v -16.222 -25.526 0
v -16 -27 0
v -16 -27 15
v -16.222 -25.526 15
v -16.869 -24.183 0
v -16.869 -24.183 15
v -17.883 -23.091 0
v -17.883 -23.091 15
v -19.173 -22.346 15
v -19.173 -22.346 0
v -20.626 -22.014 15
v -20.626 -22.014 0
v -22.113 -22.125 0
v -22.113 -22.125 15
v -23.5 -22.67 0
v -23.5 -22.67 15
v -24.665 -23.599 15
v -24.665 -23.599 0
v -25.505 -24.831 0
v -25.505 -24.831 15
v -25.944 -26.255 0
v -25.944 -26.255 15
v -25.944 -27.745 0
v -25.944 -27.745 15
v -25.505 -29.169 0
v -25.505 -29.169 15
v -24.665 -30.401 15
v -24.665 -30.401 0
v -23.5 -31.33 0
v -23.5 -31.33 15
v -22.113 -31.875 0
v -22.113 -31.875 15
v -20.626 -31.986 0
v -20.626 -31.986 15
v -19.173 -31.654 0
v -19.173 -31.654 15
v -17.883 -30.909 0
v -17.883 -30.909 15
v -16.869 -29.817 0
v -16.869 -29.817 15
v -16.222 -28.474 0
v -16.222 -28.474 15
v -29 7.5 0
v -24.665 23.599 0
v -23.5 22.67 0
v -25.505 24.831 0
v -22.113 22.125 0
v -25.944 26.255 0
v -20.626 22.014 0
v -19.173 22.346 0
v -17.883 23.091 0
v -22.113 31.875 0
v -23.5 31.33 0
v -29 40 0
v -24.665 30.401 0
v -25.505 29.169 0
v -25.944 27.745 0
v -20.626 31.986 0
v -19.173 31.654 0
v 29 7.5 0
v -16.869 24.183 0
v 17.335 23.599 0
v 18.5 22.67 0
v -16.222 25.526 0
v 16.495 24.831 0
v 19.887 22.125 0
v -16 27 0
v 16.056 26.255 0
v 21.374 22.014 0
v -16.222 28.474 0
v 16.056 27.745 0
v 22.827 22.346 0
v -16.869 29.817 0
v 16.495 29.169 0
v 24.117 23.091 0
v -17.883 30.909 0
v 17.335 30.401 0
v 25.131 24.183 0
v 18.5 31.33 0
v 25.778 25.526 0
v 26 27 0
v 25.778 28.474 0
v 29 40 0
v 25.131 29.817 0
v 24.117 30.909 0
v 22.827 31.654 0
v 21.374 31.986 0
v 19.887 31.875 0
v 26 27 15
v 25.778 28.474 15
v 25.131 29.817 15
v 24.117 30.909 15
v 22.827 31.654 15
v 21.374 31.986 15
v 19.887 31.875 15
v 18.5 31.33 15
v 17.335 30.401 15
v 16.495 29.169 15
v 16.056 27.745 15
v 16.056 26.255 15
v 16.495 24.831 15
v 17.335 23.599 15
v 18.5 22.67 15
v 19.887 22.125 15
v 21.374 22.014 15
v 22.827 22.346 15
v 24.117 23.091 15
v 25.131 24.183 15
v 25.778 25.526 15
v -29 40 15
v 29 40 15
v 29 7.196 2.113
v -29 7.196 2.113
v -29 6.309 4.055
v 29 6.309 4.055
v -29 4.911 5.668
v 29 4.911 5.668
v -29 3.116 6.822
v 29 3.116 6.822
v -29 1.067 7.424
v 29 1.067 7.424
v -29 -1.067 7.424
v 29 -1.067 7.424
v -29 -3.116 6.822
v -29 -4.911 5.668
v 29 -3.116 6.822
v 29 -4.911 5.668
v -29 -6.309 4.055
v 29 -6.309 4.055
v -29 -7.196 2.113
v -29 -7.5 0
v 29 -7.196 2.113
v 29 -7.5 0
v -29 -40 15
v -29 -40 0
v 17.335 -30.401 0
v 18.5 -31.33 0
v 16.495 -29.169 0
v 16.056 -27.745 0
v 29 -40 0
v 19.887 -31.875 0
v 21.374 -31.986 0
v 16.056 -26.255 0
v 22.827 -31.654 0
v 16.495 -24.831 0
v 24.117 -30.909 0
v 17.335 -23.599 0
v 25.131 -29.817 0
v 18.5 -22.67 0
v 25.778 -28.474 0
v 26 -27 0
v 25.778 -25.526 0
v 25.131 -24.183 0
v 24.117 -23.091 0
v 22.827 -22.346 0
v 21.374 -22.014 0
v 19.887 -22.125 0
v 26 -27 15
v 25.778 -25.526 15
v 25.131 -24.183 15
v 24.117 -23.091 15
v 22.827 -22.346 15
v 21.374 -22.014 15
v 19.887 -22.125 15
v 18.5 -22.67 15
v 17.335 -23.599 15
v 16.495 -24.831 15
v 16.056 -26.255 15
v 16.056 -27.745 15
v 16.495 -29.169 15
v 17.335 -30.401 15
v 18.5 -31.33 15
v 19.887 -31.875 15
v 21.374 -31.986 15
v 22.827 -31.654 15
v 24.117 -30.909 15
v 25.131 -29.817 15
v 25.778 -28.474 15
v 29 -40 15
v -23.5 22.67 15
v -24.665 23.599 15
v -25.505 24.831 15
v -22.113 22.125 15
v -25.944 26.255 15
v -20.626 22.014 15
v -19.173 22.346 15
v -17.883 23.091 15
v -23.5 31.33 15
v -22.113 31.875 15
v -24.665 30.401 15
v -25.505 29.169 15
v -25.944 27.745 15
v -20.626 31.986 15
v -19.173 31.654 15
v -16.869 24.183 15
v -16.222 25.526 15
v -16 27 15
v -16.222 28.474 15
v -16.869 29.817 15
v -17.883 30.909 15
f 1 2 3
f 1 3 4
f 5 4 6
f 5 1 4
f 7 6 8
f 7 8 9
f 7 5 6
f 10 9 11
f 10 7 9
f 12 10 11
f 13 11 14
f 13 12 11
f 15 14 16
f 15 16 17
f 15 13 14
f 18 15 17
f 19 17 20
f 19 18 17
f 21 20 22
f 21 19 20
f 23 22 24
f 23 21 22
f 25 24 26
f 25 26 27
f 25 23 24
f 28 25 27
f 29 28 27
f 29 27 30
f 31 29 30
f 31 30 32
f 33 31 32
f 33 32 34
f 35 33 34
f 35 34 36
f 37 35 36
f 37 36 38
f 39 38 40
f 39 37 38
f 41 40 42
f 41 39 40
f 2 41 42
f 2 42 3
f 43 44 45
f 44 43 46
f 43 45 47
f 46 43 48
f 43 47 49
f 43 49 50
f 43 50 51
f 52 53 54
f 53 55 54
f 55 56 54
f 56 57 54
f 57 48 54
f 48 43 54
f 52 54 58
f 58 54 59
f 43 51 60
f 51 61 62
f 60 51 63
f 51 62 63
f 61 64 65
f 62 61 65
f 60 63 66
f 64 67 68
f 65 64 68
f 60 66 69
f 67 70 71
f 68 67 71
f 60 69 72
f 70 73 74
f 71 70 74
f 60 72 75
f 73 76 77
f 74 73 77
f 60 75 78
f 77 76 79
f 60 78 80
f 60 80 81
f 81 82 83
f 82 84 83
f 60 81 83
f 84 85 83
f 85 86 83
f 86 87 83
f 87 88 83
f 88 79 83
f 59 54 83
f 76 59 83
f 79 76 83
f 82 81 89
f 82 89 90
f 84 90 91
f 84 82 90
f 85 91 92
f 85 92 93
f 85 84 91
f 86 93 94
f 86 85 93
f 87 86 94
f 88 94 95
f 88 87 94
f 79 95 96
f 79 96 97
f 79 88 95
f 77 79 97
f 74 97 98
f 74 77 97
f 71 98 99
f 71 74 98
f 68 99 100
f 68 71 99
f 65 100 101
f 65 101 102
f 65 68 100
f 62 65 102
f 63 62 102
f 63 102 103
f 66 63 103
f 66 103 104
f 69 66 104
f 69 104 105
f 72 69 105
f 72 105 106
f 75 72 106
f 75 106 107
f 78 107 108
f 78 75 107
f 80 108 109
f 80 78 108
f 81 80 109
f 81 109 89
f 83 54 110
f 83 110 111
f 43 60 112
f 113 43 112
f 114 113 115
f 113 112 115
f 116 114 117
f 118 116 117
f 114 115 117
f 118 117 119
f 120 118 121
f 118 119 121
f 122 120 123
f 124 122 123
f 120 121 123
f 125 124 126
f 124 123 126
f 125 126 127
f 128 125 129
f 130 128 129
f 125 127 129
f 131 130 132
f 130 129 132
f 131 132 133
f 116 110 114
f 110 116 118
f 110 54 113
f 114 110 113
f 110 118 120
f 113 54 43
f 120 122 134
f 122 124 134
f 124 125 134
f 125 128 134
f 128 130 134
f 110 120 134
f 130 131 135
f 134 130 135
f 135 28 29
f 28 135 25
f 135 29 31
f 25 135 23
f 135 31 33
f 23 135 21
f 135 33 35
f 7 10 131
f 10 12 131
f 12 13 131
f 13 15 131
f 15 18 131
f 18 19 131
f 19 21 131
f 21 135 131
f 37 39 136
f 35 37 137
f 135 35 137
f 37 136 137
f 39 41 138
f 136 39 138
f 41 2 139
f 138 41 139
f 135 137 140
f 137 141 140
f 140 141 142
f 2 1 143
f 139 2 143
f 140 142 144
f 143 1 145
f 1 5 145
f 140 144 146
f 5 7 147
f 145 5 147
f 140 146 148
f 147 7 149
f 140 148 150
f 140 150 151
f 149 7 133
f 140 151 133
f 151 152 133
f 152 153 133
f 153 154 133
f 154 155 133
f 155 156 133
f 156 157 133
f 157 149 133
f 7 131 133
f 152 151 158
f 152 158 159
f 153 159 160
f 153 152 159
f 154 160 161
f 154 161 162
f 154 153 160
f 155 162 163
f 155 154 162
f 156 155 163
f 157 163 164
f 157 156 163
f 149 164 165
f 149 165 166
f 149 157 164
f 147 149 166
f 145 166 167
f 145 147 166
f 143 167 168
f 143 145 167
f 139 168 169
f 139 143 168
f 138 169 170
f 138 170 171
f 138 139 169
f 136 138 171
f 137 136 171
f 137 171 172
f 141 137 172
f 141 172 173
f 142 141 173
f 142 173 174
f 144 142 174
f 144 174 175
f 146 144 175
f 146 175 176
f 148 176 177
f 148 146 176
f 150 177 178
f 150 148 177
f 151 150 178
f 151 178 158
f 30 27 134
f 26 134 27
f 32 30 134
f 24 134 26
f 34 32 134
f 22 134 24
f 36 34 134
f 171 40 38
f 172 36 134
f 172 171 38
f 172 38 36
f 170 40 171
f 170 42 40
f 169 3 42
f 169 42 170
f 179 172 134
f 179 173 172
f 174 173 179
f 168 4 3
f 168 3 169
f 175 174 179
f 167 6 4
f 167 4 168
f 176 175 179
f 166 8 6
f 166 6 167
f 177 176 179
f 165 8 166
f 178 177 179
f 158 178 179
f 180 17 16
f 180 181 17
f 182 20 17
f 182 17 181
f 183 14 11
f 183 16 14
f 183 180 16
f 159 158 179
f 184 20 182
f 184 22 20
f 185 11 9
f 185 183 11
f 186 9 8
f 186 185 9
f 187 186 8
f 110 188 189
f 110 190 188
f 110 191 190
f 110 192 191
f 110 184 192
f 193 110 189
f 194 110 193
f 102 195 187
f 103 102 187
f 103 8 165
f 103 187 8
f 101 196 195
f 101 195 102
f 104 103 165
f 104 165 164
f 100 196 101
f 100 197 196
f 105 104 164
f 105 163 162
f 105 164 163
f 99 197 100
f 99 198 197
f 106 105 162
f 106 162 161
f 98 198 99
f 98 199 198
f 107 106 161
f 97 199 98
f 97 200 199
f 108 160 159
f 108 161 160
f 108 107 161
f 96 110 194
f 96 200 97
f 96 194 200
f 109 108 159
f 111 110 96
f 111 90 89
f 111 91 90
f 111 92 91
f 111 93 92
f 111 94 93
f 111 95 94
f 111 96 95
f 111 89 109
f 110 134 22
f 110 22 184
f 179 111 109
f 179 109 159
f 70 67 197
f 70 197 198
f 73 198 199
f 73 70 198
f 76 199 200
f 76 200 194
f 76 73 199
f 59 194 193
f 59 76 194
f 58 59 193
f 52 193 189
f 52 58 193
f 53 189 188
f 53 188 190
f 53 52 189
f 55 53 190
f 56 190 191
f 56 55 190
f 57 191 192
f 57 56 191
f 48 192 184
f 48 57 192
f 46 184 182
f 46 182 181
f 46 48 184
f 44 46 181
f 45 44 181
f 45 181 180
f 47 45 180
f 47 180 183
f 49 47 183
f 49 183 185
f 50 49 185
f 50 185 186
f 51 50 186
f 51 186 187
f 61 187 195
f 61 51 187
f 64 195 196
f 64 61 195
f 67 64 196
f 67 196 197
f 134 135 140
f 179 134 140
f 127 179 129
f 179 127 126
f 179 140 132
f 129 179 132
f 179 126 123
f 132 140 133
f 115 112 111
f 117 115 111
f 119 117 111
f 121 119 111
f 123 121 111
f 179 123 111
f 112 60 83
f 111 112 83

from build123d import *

# Parameters (mm, degrees)
F0_W     = 58
F0_H     = 32.5
F0_R     = 5
F0_H_2   = 15
F1_DEPTH = 15
F2_R     = 7.5
F3_DEPTH = 30


with BuildPart() as f1:
    # F0 (on Top) → F1 (new body)
    with BuildSketch(Plane.XY):
        with Locations((0, 23.75)):
            Rectangle(F0_W, F0_H)
        with Locations((-21, 27)):
            Circle(F0_R, mode=Mode.SUBTRACT)
        with Locations((21, 27)):
            Circle(F0_R, mode=Mode.SUBTRACT)
        Rectangle(F0_W, F0_H_2)
        with Locations((0, -23.75)):
            Rectangle(F0_W, F0_H)
        with Locations((-21, -27)):
            Circle(F0_R, mode=Mode.SUBTRACT)
        with Locations((21, -27)):
            Circle(F0_R, mode=Mode.SUBTRACT)
    extrude(amount=F1_DEPTH)

    # F2 (on Right) → F3 (cut, symmetric)
    with BuildSketch(Plane.YZ):
        Circle(F2_R)
    extrude(amount=F3_DEPTH, both=True, mode=Mode.SUBTRACT)


solid = f1.part
